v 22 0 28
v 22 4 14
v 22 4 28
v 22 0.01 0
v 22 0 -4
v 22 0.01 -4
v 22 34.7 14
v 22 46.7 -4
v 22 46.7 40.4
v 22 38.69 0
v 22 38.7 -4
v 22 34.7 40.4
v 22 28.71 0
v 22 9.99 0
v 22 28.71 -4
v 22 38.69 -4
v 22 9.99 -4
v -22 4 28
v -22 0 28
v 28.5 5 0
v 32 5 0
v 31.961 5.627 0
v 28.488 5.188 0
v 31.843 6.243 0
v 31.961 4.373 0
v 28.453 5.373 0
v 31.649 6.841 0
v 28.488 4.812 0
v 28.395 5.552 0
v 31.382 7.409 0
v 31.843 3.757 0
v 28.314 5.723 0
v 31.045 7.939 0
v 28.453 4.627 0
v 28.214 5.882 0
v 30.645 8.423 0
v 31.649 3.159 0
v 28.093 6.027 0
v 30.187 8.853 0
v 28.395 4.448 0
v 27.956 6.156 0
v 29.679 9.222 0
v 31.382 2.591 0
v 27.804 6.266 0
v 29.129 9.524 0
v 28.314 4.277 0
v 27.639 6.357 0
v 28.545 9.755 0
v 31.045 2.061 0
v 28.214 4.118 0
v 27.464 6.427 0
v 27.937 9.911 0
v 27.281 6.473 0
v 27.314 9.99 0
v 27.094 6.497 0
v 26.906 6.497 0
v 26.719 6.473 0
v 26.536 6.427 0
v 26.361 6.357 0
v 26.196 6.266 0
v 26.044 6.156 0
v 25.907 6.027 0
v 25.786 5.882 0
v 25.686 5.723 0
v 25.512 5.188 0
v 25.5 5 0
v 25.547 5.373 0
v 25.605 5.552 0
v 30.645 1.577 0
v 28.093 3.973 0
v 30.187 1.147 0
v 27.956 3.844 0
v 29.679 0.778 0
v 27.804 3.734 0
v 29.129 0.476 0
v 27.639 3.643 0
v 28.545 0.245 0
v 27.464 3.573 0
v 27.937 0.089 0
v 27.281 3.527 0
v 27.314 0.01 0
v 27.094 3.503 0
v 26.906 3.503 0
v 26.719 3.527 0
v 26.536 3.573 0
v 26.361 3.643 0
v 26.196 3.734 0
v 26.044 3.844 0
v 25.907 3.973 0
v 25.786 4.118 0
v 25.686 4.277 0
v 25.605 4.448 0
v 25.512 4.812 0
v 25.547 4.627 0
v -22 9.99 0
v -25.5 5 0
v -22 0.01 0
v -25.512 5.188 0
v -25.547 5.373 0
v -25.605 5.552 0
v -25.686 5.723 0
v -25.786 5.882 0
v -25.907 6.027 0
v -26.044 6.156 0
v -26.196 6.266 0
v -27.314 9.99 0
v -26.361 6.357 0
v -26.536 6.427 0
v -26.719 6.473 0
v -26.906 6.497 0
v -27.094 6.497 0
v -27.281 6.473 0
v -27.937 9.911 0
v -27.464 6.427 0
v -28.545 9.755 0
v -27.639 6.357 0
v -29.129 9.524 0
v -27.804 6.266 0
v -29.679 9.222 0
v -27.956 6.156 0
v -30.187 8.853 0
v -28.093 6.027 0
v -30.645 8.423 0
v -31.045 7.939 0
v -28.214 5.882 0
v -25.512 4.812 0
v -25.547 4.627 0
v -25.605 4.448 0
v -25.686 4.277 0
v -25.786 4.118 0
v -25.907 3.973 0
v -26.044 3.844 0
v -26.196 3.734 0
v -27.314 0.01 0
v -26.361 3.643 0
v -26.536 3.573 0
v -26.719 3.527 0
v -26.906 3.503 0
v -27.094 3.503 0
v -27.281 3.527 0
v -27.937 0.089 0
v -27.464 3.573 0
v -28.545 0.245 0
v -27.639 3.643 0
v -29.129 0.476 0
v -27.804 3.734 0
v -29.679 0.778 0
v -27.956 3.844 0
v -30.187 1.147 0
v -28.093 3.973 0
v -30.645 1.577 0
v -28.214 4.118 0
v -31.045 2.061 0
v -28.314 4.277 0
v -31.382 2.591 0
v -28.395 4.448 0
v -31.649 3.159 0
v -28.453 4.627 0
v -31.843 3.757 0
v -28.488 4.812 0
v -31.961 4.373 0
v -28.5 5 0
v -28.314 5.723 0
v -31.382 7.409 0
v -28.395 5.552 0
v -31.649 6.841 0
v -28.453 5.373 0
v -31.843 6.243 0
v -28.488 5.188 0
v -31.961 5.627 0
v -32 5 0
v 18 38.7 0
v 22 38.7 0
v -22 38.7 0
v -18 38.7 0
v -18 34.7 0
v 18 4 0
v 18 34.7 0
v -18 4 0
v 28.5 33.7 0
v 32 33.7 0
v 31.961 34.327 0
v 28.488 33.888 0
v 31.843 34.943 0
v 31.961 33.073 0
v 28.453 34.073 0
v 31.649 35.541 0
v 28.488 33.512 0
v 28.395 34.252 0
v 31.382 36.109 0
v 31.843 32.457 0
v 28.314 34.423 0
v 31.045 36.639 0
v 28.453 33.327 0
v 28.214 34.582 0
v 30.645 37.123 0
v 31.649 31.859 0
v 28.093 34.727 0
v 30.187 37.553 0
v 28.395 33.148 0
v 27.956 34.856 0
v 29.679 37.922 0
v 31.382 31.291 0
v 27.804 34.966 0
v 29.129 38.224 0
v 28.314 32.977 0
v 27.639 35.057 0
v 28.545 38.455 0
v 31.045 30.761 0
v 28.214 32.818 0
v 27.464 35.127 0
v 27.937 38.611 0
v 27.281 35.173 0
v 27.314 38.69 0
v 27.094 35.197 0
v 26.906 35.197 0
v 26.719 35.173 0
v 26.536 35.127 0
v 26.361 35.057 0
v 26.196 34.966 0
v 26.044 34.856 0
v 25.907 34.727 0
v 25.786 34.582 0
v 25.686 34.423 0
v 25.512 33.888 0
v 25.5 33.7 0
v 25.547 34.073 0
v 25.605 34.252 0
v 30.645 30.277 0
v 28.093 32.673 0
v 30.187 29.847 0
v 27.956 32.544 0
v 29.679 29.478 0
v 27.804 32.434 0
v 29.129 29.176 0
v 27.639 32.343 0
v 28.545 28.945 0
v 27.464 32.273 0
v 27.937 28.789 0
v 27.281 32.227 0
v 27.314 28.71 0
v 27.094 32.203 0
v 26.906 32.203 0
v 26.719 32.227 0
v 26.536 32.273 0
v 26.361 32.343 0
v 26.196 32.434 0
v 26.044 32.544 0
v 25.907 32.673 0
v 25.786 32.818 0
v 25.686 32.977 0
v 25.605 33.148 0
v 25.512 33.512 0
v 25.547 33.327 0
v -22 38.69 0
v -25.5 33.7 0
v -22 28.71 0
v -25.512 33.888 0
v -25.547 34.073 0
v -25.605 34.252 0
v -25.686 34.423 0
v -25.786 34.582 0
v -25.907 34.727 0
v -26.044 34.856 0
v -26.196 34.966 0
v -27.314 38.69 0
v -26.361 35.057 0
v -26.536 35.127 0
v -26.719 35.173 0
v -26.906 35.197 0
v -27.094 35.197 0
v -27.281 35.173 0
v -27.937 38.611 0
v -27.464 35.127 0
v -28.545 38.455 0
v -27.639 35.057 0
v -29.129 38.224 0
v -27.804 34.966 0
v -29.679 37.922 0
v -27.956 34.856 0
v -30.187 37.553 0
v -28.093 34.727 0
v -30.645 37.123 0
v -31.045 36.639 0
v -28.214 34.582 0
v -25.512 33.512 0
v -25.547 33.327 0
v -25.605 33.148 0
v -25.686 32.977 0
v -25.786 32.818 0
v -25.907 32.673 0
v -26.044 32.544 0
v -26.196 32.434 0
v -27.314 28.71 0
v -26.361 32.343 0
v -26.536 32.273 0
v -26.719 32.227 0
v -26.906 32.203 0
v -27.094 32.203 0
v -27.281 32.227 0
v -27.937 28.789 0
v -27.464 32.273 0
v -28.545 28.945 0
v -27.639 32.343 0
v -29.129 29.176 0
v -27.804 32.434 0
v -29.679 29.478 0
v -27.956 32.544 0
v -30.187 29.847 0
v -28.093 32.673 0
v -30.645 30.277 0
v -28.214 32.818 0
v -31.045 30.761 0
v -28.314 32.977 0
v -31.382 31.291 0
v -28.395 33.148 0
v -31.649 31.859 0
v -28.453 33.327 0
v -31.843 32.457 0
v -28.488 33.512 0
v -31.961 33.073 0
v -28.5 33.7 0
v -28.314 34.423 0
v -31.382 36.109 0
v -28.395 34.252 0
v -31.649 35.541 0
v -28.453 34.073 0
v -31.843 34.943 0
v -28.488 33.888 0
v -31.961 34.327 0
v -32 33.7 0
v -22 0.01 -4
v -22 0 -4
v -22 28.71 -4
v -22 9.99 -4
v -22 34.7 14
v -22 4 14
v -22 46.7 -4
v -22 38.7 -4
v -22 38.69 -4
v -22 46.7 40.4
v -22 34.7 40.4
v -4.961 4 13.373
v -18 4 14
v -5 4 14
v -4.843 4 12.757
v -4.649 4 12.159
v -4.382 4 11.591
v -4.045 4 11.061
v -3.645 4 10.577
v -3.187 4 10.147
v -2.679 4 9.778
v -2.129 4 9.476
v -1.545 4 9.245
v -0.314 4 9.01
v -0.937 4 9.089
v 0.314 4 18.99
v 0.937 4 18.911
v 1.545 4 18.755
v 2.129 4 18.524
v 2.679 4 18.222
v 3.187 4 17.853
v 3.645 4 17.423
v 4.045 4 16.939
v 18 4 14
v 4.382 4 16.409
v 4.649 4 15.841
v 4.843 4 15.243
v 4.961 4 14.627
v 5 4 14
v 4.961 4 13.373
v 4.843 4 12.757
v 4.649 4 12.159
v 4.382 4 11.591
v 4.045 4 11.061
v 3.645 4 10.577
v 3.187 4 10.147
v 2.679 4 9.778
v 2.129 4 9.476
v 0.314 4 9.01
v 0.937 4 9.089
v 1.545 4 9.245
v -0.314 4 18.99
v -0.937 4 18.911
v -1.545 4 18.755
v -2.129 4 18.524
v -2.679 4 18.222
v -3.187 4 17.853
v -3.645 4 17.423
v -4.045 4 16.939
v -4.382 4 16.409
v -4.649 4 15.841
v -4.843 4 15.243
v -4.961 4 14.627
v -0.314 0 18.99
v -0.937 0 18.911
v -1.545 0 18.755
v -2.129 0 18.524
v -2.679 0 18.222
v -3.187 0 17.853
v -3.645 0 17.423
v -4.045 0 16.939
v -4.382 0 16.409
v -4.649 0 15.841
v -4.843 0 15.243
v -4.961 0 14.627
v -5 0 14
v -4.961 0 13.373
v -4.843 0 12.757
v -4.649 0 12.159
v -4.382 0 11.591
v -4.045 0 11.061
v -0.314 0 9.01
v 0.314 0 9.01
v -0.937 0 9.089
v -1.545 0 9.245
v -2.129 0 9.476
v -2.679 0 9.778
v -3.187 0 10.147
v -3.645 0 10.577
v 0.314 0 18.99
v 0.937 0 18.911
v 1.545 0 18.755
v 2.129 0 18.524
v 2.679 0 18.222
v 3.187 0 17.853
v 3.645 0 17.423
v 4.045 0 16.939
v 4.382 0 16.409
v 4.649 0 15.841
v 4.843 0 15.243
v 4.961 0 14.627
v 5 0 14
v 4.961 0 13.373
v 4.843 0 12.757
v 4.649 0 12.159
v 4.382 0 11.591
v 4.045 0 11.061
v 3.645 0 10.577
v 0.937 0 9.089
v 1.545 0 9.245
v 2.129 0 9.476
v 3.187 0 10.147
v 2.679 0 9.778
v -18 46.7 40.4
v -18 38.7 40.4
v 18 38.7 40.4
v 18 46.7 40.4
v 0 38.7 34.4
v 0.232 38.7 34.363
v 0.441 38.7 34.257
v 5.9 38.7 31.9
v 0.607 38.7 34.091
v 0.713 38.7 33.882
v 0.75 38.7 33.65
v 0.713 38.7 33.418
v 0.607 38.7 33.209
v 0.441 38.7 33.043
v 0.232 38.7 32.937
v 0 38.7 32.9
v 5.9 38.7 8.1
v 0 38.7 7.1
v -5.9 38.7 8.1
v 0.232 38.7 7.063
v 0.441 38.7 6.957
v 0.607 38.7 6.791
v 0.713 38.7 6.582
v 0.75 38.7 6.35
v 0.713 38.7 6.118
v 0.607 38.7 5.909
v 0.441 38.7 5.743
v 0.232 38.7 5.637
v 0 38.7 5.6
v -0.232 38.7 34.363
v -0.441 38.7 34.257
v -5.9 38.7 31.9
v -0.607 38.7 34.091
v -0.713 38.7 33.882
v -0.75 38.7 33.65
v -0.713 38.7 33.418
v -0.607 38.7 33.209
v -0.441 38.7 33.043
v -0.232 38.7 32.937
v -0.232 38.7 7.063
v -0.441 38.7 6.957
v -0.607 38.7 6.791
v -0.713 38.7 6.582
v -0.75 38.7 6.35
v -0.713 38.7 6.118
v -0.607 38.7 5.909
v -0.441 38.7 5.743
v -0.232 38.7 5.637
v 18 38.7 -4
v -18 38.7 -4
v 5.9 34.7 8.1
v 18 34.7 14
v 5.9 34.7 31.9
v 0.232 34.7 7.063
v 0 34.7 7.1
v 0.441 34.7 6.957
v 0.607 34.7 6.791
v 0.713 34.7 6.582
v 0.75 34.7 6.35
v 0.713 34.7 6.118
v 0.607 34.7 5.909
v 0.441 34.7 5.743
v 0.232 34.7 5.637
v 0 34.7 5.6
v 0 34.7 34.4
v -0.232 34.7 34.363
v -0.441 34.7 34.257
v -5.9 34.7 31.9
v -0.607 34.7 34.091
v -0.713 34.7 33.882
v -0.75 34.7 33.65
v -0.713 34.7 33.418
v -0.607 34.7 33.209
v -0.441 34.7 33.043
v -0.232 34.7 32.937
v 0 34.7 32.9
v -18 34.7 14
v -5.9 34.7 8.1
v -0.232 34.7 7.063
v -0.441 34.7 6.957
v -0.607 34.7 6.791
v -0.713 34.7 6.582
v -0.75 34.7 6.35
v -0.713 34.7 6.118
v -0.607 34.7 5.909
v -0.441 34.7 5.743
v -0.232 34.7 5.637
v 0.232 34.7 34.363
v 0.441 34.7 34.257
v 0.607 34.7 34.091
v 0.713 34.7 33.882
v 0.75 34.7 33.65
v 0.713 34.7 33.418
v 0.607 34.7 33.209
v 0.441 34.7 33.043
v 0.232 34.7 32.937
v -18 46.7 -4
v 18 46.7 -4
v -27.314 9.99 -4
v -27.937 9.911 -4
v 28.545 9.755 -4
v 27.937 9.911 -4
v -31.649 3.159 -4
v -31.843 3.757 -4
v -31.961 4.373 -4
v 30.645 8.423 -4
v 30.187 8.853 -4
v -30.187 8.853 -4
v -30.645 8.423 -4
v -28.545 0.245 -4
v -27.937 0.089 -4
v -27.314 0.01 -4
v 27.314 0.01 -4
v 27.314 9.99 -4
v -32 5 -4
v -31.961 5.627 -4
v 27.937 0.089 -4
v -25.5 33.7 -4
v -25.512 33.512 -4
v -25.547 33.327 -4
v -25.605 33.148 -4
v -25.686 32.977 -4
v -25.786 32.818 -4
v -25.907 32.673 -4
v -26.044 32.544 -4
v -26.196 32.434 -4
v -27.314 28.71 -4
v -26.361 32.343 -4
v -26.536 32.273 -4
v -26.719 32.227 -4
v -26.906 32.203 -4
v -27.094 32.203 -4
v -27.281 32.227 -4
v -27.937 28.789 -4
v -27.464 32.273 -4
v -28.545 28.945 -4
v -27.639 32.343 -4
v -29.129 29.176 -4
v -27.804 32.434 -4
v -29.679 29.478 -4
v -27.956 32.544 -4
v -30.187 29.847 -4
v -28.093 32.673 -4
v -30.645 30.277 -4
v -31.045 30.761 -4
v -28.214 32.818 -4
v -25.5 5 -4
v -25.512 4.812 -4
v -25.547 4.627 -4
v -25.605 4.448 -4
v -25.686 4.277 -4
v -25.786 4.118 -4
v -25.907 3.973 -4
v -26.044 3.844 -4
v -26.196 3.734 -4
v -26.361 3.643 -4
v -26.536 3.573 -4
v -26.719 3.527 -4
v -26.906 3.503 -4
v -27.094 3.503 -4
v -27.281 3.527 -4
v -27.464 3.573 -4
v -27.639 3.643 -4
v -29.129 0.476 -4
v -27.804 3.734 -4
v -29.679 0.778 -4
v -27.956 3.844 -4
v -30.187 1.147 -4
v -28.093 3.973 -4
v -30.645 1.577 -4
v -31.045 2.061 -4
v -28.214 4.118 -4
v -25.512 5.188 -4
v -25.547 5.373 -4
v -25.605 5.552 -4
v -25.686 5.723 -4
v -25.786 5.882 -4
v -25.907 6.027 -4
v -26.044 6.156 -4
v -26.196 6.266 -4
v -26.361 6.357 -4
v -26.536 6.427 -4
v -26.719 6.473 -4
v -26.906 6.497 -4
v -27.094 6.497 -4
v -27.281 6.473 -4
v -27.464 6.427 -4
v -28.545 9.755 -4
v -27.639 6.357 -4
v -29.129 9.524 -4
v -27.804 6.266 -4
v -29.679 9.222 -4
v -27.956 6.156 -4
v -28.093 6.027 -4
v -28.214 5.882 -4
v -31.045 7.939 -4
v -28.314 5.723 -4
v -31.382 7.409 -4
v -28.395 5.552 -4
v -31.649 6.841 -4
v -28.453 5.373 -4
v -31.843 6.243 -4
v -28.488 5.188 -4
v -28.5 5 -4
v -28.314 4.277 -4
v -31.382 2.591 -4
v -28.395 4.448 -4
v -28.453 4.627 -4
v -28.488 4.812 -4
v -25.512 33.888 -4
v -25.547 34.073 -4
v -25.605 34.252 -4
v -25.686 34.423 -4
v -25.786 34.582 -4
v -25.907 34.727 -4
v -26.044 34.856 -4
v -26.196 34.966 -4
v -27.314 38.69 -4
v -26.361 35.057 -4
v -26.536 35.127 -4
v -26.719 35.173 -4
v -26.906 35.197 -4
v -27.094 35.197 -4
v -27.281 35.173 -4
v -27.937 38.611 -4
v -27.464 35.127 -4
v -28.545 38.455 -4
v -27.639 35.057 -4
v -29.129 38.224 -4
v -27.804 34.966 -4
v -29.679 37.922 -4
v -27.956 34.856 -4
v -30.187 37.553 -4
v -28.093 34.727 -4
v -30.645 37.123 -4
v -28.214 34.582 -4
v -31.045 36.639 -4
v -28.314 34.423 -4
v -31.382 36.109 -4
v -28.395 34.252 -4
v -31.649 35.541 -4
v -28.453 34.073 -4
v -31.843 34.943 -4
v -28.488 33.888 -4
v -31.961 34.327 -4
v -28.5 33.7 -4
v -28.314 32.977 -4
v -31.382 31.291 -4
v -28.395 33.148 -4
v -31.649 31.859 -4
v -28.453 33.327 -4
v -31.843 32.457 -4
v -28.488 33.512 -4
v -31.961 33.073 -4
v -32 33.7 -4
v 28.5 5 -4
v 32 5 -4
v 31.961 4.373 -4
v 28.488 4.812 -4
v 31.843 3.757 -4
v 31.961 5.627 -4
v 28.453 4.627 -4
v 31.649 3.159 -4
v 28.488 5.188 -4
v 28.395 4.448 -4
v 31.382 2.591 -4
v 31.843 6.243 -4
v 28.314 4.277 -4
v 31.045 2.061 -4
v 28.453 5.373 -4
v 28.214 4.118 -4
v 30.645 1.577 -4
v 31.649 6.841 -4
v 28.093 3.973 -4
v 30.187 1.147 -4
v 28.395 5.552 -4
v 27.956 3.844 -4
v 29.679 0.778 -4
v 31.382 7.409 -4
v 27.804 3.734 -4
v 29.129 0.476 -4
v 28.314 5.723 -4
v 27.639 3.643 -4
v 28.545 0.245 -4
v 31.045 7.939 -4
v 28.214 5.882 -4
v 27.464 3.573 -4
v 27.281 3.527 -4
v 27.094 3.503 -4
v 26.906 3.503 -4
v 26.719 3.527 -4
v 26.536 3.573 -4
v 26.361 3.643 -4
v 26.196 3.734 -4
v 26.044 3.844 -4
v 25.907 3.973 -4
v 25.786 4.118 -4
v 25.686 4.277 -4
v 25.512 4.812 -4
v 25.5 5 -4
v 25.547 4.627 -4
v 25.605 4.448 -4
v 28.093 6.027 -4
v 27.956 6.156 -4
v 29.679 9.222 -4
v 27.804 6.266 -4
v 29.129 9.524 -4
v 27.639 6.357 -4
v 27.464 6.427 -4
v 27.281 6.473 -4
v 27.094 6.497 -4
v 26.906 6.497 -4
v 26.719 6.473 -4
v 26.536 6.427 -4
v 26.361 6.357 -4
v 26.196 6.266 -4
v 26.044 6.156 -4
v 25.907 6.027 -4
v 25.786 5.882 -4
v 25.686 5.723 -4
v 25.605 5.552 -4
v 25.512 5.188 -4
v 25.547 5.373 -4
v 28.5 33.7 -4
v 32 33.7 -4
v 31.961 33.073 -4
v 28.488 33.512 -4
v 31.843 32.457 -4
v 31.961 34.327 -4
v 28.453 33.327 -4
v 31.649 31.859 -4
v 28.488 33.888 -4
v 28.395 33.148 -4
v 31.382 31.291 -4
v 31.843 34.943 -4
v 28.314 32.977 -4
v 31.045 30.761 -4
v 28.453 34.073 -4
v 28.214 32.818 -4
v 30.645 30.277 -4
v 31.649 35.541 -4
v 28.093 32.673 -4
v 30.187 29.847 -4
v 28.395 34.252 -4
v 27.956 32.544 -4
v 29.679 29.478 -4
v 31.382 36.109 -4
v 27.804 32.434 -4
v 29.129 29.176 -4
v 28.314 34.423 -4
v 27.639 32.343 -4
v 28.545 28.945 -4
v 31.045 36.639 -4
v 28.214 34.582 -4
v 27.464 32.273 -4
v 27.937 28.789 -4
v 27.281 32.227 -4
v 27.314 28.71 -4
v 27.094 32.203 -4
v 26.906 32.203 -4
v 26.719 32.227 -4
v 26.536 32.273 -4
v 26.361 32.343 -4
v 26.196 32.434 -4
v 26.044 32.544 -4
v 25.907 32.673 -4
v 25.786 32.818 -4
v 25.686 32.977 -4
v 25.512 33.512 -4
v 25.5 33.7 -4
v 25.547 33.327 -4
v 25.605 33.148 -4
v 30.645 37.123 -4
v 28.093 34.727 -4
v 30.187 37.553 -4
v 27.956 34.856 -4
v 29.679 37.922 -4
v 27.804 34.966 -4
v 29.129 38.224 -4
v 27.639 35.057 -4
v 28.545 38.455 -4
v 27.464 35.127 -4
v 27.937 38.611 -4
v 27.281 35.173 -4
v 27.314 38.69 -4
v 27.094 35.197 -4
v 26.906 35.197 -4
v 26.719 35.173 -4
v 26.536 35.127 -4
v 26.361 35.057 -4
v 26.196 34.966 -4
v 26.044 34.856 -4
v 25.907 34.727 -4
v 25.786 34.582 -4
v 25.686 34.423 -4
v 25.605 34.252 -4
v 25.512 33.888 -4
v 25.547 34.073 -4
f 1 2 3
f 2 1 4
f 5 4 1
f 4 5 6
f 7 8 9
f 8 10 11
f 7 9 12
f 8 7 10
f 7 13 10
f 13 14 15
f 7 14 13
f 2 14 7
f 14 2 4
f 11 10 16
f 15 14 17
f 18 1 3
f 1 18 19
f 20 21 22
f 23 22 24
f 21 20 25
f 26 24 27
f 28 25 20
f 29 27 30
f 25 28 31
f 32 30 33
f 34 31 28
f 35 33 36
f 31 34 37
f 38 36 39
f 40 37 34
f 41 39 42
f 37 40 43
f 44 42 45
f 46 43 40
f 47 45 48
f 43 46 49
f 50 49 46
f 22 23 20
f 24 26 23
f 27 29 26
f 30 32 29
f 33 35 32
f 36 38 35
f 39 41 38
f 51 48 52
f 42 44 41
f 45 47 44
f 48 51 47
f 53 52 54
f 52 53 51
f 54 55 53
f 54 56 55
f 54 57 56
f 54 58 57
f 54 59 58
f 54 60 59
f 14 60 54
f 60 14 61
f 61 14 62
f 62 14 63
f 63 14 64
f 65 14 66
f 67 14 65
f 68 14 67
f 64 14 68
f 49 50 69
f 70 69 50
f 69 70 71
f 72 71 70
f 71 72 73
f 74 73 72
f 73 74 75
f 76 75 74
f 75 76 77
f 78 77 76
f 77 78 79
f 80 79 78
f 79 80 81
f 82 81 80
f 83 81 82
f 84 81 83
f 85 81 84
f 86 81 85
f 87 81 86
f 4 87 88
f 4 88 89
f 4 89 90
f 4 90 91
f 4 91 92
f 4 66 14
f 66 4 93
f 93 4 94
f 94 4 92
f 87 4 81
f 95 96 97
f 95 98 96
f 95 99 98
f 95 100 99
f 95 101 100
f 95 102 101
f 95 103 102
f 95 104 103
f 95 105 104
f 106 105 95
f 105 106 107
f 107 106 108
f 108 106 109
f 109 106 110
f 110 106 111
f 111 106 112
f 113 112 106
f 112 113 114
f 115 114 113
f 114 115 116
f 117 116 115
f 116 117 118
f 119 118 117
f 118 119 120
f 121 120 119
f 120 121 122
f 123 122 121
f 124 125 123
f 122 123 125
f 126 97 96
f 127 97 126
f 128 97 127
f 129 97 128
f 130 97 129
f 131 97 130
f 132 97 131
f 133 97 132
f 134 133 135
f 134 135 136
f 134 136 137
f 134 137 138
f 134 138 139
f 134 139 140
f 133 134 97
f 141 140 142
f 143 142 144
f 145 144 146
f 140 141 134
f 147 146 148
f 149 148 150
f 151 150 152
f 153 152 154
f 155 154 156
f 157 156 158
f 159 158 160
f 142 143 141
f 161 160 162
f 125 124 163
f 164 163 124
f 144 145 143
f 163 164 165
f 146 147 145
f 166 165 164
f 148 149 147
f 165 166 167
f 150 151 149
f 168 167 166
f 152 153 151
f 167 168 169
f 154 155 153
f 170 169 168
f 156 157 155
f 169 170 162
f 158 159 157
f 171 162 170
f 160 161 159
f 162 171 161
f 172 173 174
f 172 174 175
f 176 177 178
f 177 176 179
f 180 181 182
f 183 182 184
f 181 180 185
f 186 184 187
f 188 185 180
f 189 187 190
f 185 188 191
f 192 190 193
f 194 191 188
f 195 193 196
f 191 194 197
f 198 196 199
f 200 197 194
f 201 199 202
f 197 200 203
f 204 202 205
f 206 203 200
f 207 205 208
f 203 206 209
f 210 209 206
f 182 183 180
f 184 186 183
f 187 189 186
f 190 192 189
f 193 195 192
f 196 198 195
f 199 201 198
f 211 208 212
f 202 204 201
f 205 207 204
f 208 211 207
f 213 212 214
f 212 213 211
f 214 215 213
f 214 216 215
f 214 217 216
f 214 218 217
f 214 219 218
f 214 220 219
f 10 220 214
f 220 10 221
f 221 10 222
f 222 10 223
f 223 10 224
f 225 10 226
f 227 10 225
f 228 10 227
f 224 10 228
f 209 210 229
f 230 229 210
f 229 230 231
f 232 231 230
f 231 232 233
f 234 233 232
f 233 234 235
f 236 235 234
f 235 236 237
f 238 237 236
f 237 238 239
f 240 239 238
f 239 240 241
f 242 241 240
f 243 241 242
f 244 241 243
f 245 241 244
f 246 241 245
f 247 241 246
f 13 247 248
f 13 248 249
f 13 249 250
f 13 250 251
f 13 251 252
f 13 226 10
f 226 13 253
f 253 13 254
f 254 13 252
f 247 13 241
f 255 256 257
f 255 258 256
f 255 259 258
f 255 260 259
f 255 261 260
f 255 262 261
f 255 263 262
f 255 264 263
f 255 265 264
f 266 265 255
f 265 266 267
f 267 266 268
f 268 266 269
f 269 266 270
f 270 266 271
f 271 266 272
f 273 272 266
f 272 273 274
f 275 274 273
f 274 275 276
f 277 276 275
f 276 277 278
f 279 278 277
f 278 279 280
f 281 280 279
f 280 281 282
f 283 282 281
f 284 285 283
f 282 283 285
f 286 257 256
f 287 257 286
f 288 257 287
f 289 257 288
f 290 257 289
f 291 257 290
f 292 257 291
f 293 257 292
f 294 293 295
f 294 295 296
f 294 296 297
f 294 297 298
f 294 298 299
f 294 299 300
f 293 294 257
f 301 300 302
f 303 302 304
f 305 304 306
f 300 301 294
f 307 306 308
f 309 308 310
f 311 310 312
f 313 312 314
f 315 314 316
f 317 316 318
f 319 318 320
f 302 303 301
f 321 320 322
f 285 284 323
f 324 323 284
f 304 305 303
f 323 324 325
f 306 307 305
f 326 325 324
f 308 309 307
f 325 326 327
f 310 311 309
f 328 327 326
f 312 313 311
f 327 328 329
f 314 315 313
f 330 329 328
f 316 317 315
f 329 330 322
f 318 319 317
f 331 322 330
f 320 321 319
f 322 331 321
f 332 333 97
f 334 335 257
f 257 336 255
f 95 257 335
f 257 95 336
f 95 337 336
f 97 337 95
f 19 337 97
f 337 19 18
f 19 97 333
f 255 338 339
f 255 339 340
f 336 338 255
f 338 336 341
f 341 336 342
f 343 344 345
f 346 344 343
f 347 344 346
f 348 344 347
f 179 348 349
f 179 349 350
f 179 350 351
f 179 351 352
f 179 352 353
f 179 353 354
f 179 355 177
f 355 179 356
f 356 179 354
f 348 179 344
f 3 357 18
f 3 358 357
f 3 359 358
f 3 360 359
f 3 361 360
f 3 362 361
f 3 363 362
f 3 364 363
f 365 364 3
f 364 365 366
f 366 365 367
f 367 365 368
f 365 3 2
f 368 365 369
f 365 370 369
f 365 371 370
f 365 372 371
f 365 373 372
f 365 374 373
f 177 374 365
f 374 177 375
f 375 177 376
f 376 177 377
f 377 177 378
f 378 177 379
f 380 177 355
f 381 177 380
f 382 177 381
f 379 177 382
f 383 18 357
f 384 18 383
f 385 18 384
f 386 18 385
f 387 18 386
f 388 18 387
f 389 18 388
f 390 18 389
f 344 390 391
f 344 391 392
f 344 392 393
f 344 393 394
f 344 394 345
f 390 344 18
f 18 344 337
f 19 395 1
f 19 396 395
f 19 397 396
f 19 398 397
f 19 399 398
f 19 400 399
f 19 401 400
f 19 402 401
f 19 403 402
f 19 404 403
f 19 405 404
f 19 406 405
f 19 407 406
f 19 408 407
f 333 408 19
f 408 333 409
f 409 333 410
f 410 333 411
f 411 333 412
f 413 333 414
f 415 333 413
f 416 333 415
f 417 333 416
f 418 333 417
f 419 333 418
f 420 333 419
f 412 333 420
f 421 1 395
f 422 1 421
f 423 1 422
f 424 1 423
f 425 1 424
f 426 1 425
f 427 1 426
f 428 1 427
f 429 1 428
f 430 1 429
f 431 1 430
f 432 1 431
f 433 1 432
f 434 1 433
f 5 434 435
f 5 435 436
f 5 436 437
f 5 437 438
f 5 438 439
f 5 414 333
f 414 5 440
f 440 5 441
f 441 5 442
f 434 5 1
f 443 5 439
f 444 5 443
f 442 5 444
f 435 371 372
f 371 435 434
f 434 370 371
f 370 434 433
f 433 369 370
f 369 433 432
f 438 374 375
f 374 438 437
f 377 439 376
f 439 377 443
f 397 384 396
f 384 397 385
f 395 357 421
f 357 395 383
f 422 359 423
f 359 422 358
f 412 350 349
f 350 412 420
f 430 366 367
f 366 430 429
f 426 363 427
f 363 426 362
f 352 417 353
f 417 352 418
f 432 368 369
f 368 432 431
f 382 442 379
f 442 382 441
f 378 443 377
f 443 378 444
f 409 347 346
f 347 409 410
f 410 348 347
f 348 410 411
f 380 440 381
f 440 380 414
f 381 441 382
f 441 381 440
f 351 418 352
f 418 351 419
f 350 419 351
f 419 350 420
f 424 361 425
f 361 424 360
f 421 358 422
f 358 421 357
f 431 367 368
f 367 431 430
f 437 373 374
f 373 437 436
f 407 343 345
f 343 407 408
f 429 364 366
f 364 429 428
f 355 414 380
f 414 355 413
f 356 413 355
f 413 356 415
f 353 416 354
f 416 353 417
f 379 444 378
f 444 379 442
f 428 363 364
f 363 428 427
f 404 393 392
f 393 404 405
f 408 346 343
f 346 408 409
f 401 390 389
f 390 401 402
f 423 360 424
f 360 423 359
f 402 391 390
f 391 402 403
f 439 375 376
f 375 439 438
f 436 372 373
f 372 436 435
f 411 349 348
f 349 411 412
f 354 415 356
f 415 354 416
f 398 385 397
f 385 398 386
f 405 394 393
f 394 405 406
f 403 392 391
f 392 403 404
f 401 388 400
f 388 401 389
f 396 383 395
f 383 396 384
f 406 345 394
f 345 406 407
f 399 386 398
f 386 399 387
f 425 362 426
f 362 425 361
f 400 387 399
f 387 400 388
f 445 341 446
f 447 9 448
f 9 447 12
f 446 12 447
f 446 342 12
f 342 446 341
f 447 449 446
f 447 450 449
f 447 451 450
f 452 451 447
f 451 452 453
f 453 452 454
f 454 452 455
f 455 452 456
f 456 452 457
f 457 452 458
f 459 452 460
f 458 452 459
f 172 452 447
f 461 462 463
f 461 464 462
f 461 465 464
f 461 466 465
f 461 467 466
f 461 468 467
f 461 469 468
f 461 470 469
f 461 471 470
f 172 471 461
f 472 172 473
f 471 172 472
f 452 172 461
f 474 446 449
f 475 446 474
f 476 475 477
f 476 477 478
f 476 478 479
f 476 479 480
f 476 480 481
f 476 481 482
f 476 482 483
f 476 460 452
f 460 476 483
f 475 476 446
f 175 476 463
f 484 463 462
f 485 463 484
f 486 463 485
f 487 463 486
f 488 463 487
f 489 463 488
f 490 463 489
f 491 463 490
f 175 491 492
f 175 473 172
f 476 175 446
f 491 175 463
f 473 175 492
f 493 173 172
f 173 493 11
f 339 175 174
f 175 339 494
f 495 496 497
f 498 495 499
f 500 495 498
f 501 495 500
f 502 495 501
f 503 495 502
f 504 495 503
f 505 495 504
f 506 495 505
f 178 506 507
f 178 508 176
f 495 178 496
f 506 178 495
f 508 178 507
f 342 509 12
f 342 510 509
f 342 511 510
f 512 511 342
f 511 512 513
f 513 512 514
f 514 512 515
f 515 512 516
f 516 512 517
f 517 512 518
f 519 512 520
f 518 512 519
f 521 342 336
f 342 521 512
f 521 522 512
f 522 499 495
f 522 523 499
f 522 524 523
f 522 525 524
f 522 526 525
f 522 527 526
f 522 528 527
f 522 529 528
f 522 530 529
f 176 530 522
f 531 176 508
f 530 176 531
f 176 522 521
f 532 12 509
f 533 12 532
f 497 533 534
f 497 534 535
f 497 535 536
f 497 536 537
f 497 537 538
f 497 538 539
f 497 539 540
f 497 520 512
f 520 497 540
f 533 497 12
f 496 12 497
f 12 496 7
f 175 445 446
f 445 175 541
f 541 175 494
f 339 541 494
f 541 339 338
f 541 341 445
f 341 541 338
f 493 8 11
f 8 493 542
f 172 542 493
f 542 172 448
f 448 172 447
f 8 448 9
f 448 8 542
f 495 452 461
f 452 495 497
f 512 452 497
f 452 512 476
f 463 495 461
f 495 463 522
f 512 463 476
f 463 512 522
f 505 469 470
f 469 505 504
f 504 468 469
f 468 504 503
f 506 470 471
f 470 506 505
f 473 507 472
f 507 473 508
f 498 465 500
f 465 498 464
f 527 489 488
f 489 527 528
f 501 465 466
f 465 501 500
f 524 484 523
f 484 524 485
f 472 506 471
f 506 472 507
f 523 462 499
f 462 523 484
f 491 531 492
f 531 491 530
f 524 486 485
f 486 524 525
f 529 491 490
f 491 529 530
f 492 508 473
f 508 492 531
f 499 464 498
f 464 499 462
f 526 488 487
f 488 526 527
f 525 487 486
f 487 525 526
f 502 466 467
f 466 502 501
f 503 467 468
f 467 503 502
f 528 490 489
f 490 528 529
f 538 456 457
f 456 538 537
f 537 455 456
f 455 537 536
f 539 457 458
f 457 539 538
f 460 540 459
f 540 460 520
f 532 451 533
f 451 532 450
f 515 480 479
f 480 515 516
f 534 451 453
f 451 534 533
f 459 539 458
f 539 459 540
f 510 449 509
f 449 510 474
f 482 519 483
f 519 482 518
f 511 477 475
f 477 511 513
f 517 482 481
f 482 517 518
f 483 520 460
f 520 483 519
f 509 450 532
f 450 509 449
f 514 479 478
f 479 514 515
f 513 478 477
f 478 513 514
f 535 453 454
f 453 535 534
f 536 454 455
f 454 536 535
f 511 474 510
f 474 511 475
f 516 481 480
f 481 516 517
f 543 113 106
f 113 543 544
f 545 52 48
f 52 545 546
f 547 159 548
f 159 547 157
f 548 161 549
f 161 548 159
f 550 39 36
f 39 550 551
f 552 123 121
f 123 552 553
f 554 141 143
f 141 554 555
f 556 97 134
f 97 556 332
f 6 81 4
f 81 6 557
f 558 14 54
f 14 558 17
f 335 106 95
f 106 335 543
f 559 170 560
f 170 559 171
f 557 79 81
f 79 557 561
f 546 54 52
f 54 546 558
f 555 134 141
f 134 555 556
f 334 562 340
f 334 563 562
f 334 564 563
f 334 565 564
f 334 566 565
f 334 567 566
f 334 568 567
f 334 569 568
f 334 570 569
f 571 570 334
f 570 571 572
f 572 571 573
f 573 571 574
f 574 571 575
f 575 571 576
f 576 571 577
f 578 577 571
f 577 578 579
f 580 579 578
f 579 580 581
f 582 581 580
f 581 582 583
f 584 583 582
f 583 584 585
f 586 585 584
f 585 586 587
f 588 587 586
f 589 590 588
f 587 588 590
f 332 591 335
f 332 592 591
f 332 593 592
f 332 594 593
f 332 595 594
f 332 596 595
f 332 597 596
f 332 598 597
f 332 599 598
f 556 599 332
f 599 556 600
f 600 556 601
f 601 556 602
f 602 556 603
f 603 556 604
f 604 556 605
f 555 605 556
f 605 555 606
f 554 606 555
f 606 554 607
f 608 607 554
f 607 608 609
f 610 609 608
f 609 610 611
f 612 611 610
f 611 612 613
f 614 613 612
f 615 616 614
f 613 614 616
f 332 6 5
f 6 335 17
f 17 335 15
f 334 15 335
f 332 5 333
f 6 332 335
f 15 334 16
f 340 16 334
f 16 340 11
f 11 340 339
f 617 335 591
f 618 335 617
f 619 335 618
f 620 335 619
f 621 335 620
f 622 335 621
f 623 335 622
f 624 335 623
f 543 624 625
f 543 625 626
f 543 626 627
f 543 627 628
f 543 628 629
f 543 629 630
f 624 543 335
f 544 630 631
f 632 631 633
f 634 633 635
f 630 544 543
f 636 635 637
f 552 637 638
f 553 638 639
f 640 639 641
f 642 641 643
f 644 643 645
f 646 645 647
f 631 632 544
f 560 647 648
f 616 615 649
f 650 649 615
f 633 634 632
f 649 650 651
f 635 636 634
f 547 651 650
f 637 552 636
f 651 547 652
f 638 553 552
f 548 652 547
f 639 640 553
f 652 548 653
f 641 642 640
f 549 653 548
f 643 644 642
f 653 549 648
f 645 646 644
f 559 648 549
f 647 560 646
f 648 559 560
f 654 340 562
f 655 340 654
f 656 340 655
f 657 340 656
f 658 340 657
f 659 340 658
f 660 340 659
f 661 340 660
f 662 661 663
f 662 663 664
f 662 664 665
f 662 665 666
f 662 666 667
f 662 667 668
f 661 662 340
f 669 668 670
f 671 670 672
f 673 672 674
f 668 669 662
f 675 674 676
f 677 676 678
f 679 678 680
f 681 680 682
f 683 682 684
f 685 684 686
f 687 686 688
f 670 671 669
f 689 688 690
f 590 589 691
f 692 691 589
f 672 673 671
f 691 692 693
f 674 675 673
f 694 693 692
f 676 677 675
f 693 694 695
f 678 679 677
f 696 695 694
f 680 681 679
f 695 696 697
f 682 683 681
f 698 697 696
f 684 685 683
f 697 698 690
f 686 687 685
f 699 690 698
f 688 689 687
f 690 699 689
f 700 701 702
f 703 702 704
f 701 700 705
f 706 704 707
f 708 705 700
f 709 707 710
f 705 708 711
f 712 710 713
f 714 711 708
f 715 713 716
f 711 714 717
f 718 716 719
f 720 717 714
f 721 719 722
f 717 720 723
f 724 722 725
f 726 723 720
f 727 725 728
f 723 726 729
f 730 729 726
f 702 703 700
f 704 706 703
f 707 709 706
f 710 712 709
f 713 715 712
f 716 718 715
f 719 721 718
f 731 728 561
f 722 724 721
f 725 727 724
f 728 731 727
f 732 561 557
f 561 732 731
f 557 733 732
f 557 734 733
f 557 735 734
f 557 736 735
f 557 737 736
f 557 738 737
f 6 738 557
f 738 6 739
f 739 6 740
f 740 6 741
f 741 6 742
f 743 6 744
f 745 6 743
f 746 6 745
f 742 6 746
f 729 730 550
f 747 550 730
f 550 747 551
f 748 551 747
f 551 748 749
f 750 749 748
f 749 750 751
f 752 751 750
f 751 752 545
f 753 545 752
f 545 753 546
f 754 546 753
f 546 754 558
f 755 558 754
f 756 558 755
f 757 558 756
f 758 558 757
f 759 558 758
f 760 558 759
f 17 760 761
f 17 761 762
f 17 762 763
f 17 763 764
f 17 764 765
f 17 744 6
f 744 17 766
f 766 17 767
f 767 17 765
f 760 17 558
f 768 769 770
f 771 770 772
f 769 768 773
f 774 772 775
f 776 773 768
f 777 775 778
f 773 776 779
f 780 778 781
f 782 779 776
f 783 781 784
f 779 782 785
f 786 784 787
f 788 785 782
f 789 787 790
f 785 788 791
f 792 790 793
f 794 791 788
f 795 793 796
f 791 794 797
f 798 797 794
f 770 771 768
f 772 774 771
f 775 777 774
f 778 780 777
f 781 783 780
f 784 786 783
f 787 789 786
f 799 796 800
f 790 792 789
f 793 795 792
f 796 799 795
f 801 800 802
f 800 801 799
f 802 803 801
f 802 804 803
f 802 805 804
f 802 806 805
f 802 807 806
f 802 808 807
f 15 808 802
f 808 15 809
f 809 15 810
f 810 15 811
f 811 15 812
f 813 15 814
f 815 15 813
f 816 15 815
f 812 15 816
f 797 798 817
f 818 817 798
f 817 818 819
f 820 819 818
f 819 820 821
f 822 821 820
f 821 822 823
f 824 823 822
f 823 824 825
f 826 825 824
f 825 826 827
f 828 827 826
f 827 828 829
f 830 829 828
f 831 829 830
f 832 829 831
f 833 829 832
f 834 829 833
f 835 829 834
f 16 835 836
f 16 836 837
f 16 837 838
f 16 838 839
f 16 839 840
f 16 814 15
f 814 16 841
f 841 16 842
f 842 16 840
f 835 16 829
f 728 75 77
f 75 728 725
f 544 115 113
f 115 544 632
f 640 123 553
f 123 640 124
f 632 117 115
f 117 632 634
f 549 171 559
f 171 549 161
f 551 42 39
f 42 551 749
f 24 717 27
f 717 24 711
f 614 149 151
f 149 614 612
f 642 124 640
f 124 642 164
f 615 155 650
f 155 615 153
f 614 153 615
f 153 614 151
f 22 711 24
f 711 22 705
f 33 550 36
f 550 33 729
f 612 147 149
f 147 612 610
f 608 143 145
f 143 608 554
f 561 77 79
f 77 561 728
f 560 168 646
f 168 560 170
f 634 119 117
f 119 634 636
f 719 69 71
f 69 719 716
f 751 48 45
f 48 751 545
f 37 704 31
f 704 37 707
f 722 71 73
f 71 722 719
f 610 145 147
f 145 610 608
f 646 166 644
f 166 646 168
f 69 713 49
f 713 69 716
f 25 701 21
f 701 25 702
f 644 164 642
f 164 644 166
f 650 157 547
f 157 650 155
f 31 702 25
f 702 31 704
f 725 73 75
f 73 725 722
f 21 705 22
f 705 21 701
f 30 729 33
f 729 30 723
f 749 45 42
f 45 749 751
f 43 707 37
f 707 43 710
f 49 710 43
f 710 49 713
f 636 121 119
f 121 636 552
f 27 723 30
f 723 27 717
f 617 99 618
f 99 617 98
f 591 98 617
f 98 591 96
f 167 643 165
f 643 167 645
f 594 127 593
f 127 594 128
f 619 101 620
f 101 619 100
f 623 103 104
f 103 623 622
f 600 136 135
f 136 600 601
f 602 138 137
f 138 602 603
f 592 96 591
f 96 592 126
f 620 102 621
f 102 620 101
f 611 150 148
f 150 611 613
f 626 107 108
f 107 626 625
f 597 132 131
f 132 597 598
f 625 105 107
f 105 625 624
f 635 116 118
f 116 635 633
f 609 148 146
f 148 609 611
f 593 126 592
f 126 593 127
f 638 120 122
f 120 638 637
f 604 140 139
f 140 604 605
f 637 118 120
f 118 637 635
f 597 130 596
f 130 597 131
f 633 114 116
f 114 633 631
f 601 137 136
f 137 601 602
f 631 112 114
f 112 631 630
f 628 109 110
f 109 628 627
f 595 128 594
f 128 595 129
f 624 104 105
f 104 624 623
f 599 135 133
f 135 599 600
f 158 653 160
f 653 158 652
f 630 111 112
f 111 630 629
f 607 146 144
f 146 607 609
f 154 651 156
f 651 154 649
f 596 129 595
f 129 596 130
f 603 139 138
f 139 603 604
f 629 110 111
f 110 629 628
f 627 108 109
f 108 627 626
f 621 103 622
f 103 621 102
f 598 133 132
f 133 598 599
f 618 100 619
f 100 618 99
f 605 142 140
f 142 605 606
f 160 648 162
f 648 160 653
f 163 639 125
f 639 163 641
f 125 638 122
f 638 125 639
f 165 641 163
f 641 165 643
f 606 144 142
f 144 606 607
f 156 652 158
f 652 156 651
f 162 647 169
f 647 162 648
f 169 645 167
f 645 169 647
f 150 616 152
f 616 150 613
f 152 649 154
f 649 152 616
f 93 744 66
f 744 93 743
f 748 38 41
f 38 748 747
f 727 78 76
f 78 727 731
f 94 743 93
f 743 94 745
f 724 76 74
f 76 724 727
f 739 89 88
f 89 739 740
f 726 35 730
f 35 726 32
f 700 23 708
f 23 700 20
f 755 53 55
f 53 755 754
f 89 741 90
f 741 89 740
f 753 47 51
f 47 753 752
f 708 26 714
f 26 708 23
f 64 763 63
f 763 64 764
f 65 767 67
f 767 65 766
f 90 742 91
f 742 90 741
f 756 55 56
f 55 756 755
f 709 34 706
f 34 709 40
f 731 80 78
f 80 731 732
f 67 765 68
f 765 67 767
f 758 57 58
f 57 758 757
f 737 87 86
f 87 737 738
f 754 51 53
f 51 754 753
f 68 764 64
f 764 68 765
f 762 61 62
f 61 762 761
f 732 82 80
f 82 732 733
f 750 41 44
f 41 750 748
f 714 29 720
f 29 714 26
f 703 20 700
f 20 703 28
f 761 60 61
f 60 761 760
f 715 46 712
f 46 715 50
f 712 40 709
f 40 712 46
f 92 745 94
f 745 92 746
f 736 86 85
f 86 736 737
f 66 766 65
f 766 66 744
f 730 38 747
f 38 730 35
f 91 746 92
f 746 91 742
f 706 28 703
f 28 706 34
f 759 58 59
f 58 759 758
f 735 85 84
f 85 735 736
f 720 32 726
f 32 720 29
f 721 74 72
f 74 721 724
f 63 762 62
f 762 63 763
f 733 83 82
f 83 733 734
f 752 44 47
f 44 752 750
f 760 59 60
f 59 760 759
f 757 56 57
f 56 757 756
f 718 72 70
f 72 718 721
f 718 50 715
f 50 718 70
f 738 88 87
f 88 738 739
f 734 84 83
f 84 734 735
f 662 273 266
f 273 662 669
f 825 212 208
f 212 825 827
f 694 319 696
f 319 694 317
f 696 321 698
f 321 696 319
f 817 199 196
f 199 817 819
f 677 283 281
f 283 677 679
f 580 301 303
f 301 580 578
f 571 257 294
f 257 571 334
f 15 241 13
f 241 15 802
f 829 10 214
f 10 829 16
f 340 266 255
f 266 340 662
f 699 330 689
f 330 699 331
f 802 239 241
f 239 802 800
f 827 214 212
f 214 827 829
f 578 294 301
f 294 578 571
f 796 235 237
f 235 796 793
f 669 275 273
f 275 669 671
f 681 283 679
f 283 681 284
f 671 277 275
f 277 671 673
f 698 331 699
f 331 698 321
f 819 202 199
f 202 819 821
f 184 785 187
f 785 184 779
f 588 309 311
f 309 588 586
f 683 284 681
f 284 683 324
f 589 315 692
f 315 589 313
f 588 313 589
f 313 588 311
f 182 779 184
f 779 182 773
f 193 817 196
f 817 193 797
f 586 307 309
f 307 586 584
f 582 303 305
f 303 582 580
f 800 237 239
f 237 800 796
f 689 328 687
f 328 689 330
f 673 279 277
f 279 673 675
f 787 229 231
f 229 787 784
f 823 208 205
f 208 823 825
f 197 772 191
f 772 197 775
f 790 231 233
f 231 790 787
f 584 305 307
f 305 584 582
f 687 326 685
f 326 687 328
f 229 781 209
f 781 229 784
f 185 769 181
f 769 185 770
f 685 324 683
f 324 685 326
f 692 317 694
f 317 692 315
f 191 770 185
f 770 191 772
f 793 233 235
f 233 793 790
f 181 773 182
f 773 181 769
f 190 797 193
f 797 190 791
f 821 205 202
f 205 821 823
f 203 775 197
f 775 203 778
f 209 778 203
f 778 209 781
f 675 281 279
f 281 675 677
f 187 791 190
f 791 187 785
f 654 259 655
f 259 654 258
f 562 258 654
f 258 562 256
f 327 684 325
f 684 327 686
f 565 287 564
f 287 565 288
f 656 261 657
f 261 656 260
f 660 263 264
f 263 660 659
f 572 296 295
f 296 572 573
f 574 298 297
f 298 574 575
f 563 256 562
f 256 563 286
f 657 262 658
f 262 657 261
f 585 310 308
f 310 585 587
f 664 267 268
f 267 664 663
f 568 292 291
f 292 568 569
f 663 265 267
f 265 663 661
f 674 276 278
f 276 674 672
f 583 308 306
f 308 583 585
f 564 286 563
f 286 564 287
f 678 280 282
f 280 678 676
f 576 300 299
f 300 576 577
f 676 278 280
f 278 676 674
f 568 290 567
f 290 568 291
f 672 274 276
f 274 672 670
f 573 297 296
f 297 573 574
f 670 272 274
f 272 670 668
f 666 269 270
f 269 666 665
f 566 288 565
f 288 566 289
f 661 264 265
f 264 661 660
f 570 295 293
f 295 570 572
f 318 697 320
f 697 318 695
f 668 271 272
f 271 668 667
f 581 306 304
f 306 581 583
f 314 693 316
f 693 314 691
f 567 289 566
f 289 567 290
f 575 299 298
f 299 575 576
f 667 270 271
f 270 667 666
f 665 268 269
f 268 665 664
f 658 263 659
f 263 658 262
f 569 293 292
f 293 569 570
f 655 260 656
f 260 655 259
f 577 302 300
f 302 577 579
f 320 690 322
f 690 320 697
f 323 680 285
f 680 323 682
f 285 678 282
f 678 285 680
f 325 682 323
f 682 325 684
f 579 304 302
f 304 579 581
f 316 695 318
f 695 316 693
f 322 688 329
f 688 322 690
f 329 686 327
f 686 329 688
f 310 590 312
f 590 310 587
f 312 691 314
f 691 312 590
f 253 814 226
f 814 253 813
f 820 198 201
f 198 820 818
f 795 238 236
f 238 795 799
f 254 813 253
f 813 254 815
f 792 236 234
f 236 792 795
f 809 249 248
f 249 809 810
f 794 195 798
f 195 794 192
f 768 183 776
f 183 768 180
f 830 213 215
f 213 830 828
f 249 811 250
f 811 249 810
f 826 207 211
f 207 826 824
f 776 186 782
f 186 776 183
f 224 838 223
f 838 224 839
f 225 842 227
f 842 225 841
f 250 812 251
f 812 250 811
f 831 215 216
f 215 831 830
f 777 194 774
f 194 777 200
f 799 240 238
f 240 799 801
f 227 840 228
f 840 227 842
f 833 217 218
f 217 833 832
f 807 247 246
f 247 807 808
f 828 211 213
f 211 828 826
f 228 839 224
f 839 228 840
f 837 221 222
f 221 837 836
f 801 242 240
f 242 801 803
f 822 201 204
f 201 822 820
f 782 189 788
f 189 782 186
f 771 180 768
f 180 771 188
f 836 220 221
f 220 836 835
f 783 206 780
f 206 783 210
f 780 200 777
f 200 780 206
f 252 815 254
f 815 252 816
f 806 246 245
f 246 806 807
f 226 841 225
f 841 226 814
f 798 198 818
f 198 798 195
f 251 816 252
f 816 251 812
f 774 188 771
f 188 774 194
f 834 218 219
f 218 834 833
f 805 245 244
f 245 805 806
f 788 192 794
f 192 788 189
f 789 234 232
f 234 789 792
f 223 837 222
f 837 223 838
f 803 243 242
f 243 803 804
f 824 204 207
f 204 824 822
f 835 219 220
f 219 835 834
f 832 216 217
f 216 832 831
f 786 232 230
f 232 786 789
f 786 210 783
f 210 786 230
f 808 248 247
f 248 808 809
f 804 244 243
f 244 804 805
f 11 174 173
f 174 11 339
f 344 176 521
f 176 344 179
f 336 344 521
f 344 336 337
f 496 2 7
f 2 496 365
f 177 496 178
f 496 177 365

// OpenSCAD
potBodyRadius = 28.0 / 2;
potThreadRadius = 10 / 2;
potThreadLength = 10.0;
potShaftRadius = 6.5 / 2; //6.0 / 2;
potShaftLength = 12.0;

servoBodyWidth = 11.8;
servoBodyLength = 23.8;
servoBodyDepth = 3.6;
servoBossDepth = 5.1;
servoShaftRadius = 4.15 / 2; //4.05 / 2;
servoShaftLength = 3.0;
servoTabLength = 4.5;
servoTabHoleOffset = 1.0;
servoTabHoleRadius = 1.5 / 2;

servoChassisSupportBraceWidth = 8.0;

chassisWallThickness = 4.0;
chassisBezelWidth = 6.0;

couplerWallThickness = 5.0;
couplerGrubScrewRadius = 2.5 / 2;


chassisTabRadius = 5;
chassisTabHoleRadius = 3.0 / 2;
chassisMinWidthBetweenWalls = 36.0;


chassisLength = potThreadLength + potShaftLength + couplerWallThickness + servoBodyDepth + servoBossDepth + servoShaftLength;
chassisWidth = max(chassisMinWidthBetweenWalls + 2 * chassisWallThickness, potBodyRadius * 2, servoBodyWidth + 2 * chassisBezelWidth);

axisHeight = max(potBodyRadius, servoBodyWidth / 2 + servoTabLength);

couplerLength = potShaftLength + couplerWallThickness + servoShaftLength;
couplerRadius = max(potShaftRadius, servoShaftRadius) + couplerWallThickness;


//CouplerTest();

//Coupler();
Chassis();

module CouplerTest() {
  tests = [ for (i = [-2:2]) i ];
  difference() {
    translate([0, -couplerRadius, -1]) {
      cube([couplerRadius * (1 + len(tests)), couplerRadius * 2, 1 + servoShaftLength]);
    }
  
    for (i = tests) {
      translate([couplerRadius * (1 + i - min(tests)), 0, 0]) {
        cylinder(servoShaftLength + 0.001, servoShaftRadius + i * 0.025, servoShaftRadius + i * 0.025, $fn = 50);
      }
    }
    
    cylinder(servoShaftLength + 0.001, 1, 1, $fn=20);
  }
}

module Coupler() {
  difference() {
    cylinder(couplerLength, couplerRadius, couplerRadius, $fn = 50);
    
    // Pot shaft
    cylinder(potShaftLength, potShaftRadius, potShaftRadius, $fn = 50);
    
    // Servo shaft
    translate([0, 0, potShaftLength + couplerWallThickness]) {
      cylinder(servoShaftLength, servoShaftRadius, servoShaftRadius, $fn = 50);
    }
    
    // Pot grub screw
    translate([0, 0, potShaftLength / 2])
    rotate([90, 0, 0])
    cylinder(couplerRadius, couplerGrubScrewRadius, couplerGrubScrewRadius, $fn = 25);
  }
}

module Chassis() {
  // Pot wall
  difference() {
    translate([-chassisWidth / 2, 0, 0]) {
      cube([chassisWidth, chassisWallThickness, axisHeight + potBodyRadius]);
    }
    
    // Pot thread
    translate([0, 0, axisHeight]) {
      rotate([-90, 0, 0]) {
        translate([0, 0, chassisWallThickness / 2]) {
          cylinder(chassisWallThickness + 0.01, potThreadRadius, potThreadRadius, $fn = 50, center = true);
        }
      }
    }
  }
  
  servoWallHeight = axisHeight + servoBodyLength + servoTabLength + chassisWallThickness - servoBodyWidth / 2;

  // Servo wall
  translate([0, chassisLength - chassisWallThickness, 0]) {
    difference() {
      union() {
        translate([-chassisWidth / 2, 0, 0]) {
          cube([chassisWidth, chassisWallThickness, servoWallHeight]);
        }
        
        // Supports
        translate([-chassisWidth / 2, chassisWallThickness, -chassisWallThickness]) {
          cube([chassisWallThickness, servoChassisSupportBraceWidth, servoWallHeight + chassisWallThickness]);
        }
        translate([chassisWidth / 2 - chassisWallThickness, chassisWallThickness, -chassisWallThickness]) {
          cube([chassisWallThickness, servoChassisSupportBraceWidth, servoWallHeight + chassisWallThickness]);
        }
      }
      
      // Servo body
      translate([-servoBodyWidth / 2, -0.01, axisHeight - servoBodyWidth / 2]) {
        cube([servoBodyWidth, chassisWallThickness + 0.02, servoBodyLength]);
      }
      // Servo tab holes
      translate([0, 0, axisHeight - (servoBodyWidth / 2 + servoTabHoleRadius + servoTabHoleOffset)]) {
        rotate([-90, 0, 0]) {
          translate([0, 0, chassisWallThickness / 2]) {
            cylinder(chassisWallThickness + 0.02, servoTabHoleRadius, servoTabHoleRadius, $fn = 20, center = true);
          }
        }
      }
      translate([0, 0, axisHeight + servoBodyLength + servoTabHoleRadius + servoTabHoleOffset - servoBodyWidth / 2]) {
        rotate([-90, 0, 0]) {
          translate([0, 0, chassisWallThickness / 2]) {
            cylinder(chassisWallThickness + 0.02, servoTabHoleRadius, servoTabHoleRadius, $fn = 20, center = true);
          }
        }
      }
    }
  }

  // Floor
  translate([-chassisWidth / 2, 0, -chassisWallThickness]) {
    cube([chassisWidth, chassisLength, chassisWallThickness]);
  }
  
  // Tabs
  translate([0, chassisTabRadius, 0]) {
    ChassisTabsBar();
  }
  translate([0, chassisLength - chassisTabRadius, 0]) {
    ChassisTabsBar();
  }

  // Side walls
  translate([-chassisWidth / 2, 0, 0]) {
    cube([chassisWallThickness, chassisLength, axisHeight]);
  }
  translate([chassisWidth / 2 - chassisWallThickness, 0, 0]) {
    cube([chassisWallThickness, chassisLength, axisHeight]);
  }
}

module ChassisTabsBar() {
  translate([0, 0, -chassisWallThickness]) {
    difference() {
      hull() {
        translate([-(chassisWidth / 2 + chassisTabRadius), 0, 0]) {
          cylinder(chassisWallThickness, chassisTabRadius, chassisTabRadius, $fn = 50);
        }
        translate([chassisWidth / 2 + chassisTabRadius, 0, 0]) {
          cylinder(chassisWallThickness, chassisTabRadius, chassisTabRadius, $fn = 50);
        }
      }
      
      translate([-(chassisWidth / 2 + chassisTabRadius), 0, 0]) {
        cylinder(chassisWallThickness, chassisTabHoleRadius, chassisTabHoleRadius, $fn = 50);
      }
      translate([chassisWidth / 2 + chassisTabRadius, 0, 0]) {
        cylinder(chassisWallThickness, chassisTabHoleRadius, chassisTabHoleRadius, $fn = 50);
      }
    }
  }
}
